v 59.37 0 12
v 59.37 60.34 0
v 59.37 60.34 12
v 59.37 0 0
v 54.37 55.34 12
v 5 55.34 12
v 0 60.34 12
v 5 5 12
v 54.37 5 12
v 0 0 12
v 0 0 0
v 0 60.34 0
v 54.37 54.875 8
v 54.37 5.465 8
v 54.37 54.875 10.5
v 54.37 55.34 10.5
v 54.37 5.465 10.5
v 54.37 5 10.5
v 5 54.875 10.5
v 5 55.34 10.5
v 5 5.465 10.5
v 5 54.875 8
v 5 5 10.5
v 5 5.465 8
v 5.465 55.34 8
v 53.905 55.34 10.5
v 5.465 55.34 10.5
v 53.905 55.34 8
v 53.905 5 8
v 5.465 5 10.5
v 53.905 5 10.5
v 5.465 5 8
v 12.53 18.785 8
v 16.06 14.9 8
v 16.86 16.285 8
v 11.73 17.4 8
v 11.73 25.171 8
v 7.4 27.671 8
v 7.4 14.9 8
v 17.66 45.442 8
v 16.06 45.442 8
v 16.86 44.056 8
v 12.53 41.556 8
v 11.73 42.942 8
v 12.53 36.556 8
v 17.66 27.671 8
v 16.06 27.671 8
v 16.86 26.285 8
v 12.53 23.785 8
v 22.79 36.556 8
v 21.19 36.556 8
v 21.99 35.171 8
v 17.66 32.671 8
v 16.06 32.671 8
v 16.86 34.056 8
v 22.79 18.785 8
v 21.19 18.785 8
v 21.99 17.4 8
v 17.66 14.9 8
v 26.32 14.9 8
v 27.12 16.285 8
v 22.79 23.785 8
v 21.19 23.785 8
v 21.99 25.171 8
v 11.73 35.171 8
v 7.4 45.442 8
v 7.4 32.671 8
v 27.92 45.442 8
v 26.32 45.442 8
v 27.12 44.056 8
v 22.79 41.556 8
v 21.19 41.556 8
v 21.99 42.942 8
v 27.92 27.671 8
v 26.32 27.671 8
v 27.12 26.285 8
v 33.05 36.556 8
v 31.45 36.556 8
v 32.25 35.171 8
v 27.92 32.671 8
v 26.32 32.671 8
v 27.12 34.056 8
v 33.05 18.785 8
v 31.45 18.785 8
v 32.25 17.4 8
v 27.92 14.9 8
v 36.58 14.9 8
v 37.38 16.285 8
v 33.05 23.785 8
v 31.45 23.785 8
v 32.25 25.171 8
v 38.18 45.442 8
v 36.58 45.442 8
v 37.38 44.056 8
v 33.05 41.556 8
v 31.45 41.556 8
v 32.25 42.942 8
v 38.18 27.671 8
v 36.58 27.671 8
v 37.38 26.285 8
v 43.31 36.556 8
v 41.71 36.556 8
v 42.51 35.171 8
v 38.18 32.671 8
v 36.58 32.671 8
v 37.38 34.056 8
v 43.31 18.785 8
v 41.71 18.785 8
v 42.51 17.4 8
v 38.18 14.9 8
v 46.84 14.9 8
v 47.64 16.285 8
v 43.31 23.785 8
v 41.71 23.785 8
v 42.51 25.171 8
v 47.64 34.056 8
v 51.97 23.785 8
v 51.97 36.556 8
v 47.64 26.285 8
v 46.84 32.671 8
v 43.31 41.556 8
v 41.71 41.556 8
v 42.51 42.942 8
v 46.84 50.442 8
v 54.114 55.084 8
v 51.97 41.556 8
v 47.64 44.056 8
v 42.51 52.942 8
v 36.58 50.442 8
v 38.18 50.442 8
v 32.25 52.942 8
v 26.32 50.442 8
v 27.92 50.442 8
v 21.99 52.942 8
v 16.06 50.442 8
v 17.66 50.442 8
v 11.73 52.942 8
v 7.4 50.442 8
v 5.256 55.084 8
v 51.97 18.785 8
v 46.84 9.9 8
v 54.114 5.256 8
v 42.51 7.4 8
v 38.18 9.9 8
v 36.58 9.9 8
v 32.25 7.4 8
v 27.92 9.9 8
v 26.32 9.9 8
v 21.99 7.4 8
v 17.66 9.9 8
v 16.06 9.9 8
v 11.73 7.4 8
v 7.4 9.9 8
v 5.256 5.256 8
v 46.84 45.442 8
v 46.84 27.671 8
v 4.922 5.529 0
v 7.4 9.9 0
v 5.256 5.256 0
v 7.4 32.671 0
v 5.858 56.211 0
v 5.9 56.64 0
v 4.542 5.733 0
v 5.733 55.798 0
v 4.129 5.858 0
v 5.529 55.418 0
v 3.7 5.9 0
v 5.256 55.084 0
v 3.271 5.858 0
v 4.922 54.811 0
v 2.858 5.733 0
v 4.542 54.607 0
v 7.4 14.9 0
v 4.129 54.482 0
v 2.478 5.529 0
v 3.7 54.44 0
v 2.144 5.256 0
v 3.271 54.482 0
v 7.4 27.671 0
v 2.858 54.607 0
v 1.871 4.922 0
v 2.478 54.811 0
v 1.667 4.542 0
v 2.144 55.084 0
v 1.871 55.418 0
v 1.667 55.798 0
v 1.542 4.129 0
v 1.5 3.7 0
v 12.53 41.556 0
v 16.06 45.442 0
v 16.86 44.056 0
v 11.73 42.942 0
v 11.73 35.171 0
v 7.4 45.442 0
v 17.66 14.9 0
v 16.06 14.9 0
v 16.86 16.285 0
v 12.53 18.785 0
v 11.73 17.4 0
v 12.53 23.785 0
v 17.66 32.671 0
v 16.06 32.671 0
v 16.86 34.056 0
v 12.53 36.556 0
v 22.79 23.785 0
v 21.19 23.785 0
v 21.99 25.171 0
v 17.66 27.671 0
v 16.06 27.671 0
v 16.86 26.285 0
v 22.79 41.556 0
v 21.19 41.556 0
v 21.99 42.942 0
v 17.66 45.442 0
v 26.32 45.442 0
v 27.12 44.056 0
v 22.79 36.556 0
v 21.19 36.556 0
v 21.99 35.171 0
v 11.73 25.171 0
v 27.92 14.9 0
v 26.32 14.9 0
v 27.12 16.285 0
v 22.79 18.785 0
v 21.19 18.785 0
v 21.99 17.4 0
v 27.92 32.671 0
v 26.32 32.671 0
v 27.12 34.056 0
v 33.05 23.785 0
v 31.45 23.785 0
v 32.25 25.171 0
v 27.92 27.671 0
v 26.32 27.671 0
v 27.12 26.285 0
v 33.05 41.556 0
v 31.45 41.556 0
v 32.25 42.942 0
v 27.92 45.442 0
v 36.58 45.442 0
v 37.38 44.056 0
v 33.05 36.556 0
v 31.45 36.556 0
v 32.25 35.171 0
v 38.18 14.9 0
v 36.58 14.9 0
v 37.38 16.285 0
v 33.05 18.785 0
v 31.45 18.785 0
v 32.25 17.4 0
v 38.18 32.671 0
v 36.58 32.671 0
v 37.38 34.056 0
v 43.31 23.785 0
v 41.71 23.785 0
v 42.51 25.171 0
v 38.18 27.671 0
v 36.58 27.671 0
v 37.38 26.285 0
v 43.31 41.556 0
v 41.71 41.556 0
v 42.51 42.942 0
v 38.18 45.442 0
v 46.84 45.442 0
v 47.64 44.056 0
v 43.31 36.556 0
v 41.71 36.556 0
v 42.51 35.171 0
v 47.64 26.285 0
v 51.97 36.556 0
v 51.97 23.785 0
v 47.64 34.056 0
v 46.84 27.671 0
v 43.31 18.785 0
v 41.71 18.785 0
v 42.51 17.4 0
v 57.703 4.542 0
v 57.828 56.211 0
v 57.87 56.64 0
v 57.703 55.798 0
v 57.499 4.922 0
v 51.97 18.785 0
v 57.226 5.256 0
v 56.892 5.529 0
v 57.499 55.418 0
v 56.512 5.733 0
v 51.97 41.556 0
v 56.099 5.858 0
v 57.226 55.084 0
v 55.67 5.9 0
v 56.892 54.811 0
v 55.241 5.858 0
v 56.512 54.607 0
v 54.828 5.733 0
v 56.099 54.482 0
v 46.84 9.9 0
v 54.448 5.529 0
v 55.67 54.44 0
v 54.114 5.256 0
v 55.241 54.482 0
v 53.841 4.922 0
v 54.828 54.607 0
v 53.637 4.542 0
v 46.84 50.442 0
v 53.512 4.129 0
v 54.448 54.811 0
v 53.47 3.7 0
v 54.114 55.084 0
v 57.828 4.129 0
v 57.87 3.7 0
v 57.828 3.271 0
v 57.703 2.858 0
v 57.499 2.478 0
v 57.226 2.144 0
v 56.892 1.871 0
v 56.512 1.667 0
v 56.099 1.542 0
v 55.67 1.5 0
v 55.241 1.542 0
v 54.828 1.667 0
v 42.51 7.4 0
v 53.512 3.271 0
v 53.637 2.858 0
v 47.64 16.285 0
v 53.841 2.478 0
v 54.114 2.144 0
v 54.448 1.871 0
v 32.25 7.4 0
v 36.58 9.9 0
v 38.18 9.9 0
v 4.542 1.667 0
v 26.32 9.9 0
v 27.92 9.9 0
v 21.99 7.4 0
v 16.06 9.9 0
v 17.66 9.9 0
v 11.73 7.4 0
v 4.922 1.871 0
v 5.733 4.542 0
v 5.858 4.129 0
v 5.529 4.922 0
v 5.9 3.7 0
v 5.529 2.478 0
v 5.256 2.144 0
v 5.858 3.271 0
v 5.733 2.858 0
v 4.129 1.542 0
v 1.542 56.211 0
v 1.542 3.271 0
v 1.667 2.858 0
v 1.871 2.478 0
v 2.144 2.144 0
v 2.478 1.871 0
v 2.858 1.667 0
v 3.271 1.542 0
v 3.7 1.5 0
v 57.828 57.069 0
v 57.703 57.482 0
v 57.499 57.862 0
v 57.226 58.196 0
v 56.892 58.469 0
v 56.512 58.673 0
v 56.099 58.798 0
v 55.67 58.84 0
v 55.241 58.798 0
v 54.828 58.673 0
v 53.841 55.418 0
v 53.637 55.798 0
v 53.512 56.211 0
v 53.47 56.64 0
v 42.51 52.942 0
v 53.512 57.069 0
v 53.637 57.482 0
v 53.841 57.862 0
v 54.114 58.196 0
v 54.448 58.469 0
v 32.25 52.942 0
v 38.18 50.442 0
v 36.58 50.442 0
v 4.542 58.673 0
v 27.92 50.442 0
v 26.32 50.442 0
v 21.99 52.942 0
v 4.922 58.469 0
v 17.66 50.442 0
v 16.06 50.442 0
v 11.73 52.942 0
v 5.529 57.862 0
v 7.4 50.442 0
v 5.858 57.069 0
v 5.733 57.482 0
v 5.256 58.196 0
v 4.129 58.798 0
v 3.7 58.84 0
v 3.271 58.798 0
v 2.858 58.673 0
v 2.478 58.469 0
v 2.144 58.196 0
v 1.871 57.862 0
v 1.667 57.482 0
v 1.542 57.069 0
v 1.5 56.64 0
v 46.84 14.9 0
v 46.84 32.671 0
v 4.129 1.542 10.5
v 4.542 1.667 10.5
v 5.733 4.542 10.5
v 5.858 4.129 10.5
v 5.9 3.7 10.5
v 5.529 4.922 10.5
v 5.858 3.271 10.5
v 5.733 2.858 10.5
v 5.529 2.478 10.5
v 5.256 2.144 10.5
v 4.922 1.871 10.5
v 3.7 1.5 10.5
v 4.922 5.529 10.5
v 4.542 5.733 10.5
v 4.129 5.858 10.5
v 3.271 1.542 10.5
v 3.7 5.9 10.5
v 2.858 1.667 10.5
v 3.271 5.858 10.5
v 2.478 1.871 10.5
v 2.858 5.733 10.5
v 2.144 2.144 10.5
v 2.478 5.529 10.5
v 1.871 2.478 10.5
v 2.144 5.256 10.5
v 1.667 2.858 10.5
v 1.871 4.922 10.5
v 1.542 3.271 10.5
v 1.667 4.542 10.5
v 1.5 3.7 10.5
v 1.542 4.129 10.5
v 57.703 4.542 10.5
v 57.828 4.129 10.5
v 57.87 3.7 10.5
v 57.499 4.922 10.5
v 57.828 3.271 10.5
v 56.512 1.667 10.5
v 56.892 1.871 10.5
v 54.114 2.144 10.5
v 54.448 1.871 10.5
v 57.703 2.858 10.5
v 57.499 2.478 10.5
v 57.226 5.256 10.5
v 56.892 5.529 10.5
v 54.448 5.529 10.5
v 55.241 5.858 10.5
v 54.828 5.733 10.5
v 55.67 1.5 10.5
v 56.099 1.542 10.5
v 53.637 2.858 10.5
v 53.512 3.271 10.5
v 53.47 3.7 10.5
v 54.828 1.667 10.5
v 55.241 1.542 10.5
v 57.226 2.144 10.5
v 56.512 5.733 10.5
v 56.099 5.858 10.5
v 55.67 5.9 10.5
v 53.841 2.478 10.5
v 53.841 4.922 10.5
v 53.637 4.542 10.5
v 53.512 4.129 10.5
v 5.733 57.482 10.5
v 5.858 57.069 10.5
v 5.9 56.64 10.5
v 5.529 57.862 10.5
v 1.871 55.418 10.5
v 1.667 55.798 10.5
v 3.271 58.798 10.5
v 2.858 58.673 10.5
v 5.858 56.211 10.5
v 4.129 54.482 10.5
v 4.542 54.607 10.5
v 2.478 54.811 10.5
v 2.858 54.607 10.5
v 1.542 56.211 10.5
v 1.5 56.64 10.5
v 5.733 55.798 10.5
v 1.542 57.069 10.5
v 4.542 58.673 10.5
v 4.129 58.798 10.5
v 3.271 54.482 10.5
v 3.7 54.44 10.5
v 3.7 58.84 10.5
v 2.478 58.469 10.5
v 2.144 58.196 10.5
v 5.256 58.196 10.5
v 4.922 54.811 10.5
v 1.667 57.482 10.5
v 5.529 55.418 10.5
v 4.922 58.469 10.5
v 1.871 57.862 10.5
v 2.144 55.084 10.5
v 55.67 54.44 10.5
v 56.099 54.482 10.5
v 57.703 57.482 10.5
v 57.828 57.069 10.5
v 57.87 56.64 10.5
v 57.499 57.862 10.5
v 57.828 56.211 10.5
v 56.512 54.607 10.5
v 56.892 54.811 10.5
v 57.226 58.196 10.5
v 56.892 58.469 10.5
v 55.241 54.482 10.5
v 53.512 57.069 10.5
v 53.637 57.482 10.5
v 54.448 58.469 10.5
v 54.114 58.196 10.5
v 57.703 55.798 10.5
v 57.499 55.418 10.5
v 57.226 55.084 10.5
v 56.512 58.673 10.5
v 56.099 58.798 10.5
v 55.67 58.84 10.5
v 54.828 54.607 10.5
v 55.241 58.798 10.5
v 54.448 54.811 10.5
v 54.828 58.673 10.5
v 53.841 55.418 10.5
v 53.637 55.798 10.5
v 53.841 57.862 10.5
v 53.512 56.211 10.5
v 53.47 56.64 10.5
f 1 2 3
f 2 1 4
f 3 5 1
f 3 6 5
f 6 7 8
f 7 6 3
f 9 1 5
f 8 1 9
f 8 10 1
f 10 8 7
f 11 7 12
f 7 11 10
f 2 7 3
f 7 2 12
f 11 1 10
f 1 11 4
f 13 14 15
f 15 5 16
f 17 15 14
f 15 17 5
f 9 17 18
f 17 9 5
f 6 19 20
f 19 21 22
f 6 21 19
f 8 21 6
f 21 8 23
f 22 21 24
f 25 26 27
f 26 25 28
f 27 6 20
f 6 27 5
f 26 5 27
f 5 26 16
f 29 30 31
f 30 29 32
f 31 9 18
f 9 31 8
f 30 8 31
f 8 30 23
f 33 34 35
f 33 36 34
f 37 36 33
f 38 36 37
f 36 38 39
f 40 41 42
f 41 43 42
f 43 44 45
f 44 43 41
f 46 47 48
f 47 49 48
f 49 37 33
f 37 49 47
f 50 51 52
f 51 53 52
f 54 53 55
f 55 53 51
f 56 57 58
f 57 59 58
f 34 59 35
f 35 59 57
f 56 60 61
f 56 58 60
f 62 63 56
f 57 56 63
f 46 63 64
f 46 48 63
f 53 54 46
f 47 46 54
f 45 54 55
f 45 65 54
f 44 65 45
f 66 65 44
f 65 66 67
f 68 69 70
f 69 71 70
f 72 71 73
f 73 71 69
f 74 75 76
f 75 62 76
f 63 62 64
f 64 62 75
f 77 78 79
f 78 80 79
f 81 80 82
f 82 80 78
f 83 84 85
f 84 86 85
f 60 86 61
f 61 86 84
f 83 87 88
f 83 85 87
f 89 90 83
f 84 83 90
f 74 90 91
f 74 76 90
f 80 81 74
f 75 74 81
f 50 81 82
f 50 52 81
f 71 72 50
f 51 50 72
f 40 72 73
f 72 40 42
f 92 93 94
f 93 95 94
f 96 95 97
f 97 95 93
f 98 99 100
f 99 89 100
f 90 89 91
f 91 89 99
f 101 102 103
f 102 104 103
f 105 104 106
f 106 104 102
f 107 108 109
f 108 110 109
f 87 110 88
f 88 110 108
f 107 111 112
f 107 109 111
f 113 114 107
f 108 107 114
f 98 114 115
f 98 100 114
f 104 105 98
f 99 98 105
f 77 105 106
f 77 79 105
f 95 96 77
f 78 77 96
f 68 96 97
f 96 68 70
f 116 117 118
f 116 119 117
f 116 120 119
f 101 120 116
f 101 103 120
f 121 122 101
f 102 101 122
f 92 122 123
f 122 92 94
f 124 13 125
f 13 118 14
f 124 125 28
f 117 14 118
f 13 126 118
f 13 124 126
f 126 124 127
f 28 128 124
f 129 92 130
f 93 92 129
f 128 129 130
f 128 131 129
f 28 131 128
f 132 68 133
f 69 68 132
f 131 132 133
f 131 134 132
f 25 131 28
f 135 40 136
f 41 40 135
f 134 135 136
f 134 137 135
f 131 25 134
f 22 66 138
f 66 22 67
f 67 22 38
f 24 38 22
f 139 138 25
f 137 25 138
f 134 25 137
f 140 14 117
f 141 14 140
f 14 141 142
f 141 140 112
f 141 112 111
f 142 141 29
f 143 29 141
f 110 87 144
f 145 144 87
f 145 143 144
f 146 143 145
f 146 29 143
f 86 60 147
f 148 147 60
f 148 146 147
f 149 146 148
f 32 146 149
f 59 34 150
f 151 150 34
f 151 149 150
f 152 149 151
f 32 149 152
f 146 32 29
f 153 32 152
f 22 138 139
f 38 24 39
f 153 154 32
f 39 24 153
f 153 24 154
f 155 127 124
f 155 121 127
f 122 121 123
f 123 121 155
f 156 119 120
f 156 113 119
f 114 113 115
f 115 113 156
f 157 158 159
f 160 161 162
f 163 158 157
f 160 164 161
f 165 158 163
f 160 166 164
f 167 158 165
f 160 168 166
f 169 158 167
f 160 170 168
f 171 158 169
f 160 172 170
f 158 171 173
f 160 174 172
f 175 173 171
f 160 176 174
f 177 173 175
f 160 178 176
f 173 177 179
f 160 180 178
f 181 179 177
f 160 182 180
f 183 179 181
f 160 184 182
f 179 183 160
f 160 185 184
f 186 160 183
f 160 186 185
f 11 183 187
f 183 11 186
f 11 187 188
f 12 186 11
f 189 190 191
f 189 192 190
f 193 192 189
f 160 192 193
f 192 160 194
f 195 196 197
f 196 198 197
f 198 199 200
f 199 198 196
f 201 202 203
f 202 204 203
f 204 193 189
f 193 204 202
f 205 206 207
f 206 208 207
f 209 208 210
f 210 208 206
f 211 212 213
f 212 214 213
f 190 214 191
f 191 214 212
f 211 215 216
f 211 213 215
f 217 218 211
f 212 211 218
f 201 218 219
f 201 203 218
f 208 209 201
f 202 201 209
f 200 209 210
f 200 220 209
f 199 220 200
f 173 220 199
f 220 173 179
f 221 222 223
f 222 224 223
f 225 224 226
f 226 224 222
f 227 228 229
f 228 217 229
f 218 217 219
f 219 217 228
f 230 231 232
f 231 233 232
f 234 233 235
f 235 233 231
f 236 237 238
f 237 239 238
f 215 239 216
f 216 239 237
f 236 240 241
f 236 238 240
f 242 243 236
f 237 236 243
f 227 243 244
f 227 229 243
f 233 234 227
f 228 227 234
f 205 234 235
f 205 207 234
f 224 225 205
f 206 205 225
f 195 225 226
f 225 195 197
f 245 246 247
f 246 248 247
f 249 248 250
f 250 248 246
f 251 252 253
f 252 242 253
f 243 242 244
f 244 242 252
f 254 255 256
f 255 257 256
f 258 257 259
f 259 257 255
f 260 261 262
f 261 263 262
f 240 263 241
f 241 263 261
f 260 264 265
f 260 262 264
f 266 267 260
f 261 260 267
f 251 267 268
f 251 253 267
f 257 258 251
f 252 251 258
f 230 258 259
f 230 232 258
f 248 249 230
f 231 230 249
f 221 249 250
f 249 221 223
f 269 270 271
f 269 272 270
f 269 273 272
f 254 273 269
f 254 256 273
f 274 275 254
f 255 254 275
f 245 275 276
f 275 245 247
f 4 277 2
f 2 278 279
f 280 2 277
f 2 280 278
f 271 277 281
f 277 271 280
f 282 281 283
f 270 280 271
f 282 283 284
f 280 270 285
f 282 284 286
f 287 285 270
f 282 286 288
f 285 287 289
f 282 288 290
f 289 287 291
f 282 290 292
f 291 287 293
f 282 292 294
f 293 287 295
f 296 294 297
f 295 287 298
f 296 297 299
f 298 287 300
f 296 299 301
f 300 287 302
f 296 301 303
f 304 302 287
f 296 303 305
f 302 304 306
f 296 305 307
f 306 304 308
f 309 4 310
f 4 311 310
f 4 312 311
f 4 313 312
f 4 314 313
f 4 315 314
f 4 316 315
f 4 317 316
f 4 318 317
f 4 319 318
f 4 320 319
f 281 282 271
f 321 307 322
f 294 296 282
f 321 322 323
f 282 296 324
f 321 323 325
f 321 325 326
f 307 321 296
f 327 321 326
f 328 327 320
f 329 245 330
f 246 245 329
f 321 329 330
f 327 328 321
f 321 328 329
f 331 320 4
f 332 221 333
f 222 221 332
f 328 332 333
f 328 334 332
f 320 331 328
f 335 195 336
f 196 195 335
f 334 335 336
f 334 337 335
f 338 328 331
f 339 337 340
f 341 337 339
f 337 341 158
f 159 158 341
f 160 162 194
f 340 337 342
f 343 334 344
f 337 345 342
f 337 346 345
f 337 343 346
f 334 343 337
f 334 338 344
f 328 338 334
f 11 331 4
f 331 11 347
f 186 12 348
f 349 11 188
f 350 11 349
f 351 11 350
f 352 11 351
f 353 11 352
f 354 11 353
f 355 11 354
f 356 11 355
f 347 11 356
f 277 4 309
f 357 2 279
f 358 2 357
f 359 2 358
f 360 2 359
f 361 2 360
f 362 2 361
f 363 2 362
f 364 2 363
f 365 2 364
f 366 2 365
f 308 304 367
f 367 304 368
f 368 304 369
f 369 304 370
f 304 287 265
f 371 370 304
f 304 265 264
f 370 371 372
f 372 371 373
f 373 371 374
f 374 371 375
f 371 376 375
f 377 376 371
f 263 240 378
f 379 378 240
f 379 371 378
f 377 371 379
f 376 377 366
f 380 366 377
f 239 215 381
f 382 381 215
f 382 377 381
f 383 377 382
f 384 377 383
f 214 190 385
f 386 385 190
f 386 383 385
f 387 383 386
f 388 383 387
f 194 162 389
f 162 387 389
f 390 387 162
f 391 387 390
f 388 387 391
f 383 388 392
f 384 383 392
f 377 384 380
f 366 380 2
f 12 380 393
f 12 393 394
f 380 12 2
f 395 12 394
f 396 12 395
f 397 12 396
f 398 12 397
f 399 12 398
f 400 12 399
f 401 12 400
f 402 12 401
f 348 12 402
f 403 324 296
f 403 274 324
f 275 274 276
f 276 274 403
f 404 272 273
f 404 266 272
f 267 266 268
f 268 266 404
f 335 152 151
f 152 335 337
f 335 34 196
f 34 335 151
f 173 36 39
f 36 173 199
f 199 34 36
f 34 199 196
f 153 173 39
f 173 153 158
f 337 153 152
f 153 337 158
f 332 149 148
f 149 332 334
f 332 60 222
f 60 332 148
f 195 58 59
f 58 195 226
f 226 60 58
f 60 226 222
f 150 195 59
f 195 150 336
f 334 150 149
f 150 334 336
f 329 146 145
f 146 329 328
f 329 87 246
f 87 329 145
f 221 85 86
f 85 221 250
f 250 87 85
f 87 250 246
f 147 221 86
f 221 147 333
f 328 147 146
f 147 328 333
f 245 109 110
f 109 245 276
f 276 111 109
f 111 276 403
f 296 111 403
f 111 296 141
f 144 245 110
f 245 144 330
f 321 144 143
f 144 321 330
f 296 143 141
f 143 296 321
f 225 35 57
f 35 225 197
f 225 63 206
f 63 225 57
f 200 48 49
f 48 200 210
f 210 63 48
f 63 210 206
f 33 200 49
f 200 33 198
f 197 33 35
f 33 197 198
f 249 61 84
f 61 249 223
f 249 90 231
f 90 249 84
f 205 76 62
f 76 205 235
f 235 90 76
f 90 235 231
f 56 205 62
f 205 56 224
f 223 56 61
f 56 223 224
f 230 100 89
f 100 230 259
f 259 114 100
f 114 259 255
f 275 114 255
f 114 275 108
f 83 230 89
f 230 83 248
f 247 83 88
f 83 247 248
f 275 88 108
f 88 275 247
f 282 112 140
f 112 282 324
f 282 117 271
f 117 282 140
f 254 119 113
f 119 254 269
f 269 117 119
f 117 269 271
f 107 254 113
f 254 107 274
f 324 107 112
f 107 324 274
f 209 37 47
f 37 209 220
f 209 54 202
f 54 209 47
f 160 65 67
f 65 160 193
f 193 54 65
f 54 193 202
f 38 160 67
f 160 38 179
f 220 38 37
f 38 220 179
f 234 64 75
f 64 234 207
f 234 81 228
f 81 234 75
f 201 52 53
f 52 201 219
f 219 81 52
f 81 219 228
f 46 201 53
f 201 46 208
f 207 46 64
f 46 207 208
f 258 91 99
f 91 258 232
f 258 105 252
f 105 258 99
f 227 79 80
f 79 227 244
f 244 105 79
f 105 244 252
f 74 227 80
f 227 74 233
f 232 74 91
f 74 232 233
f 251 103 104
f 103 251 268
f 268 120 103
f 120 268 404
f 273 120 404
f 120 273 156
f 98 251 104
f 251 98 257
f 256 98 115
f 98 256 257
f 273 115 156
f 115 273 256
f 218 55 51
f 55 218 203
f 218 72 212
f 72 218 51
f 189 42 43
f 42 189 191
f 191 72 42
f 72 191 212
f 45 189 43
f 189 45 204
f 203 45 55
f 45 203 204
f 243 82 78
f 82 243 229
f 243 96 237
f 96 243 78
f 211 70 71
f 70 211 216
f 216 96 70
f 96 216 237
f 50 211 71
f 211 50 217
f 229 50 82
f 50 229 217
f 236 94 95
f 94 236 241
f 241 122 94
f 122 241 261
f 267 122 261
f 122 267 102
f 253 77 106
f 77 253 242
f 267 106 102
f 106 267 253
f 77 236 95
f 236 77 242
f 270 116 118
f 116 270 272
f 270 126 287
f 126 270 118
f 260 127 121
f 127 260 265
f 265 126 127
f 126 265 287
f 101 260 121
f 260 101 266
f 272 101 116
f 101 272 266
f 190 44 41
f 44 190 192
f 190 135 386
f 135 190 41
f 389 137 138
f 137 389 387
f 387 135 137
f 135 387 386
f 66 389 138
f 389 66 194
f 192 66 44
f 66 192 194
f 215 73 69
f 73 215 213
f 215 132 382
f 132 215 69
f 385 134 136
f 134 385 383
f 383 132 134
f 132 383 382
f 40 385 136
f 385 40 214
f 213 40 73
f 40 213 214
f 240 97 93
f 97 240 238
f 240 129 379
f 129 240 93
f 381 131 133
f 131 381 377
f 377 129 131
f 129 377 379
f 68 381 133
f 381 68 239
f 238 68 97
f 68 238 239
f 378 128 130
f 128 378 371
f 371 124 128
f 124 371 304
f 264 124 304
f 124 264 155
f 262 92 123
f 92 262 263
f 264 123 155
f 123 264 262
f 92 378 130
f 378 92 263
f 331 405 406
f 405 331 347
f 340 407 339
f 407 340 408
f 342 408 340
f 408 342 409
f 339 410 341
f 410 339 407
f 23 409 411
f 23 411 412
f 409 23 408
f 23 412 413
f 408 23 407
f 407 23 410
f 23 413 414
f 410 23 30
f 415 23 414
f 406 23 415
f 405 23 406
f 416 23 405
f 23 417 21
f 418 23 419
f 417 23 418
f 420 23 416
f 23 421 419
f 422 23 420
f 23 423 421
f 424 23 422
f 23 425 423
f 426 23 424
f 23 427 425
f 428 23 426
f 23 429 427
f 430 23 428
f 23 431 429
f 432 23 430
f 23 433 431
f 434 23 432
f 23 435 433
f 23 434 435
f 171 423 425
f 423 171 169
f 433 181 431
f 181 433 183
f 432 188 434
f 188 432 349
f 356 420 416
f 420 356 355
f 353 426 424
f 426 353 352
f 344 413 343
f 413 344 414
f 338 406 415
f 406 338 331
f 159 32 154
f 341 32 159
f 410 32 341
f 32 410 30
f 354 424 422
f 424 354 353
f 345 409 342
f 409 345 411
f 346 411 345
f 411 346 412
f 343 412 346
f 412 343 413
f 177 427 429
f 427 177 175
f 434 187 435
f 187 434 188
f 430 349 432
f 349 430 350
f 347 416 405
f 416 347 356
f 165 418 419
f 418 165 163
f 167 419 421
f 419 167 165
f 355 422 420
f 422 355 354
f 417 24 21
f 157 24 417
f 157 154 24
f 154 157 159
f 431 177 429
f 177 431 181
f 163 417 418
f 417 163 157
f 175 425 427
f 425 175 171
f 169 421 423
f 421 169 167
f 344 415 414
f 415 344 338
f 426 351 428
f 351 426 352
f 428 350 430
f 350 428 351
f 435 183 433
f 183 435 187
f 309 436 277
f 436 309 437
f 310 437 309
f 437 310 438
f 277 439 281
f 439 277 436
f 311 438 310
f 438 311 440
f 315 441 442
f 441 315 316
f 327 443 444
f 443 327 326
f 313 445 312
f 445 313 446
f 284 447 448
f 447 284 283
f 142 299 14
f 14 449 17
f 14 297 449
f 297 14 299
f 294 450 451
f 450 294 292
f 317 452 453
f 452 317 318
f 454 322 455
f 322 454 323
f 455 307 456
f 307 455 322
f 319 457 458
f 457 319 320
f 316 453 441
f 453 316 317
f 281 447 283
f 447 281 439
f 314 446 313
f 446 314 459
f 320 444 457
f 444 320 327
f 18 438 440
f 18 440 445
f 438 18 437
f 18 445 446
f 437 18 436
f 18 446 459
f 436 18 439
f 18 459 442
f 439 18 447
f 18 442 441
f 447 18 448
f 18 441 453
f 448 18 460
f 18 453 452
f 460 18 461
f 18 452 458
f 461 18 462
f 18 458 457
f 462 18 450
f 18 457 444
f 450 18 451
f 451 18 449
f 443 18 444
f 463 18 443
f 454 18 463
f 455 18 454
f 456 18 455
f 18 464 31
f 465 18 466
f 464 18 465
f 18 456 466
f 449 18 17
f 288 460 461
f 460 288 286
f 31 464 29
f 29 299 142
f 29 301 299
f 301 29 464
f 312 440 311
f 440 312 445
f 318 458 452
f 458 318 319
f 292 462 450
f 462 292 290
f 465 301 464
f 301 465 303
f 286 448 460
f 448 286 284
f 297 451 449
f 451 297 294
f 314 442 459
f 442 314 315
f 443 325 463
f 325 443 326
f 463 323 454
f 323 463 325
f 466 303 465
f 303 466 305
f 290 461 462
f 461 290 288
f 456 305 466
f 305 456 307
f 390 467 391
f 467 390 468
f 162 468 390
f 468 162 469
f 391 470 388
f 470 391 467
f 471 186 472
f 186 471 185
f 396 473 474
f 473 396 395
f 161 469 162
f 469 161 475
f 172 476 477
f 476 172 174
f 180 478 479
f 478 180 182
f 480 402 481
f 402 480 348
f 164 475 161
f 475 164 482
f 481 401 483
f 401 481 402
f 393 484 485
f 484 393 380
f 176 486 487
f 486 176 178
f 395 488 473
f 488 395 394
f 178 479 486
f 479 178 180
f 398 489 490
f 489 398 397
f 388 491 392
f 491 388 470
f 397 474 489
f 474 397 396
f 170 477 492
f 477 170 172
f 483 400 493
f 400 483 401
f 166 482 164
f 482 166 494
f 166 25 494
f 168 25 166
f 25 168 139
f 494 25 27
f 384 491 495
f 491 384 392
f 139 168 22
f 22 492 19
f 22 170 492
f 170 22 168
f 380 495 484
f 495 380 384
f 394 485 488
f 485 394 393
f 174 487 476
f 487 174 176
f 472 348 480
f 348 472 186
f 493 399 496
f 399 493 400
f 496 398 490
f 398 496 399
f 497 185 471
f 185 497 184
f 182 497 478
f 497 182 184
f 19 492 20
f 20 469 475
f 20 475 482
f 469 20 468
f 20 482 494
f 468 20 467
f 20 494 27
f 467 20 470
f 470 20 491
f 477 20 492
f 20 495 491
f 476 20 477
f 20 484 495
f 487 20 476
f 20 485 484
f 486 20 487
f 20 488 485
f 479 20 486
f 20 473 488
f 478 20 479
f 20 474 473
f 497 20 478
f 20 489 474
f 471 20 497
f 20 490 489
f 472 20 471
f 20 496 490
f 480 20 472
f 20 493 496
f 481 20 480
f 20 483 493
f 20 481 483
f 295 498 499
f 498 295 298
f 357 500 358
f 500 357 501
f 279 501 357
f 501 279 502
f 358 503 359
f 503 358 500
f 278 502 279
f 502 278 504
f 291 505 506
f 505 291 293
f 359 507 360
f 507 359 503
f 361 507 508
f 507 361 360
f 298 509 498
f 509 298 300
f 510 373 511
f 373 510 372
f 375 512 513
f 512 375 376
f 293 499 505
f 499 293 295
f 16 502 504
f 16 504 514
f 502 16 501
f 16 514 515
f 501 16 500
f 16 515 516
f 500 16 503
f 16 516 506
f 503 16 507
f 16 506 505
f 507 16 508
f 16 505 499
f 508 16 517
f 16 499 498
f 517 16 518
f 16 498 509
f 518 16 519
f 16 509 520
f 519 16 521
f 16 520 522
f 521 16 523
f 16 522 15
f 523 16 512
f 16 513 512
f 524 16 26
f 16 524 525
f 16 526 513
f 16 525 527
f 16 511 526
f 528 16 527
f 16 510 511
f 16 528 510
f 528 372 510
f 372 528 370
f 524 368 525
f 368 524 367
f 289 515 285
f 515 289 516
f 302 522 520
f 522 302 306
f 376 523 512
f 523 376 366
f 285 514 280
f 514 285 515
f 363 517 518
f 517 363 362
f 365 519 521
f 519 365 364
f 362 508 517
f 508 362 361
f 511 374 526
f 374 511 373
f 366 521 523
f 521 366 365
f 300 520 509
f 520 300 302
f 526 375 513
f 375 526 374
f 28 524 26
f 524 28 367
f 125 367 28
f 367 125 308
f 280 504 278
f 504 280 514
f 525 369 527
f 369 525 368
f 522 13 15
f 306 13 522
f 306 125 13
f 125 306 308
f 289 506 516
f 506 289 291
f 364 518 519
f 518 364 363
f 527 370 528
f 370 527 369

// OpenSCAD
$fn = 32;

// ----------------------------------------------------------------------
// Honeycomb panel: 59.37 x 60.34 mm, 20 cells of 10 mm
// ----------------------------------------------------------------------

// --- parameters (mm) ---
panel_w = 59.37;          // panel width
panel_d = 60.34;          // panel depth
thick = 8;                // panel thickness
cell_r = 5;               // hex cell circumradius
pitch = 10.26;            // hex cell pitch (centre to centre)
web = 1.6;                // web between the cells
columns = 4;              // columns of cells
rows = 5;                 // rows of cells
cell_count = 20;          // total cells
shift_x = 11.73;          // first cell offset in x
shift_y = 12.4;           // first cell offset in y
mount_d = 4.4;            // corner mounting holes
hole_off = 3.7;           // mounting hole offset from the corners
rim_h = 12;               // rim height
rim_t = 5;                // rim wall thickness

difference() {
  union() {
    cube([panel_w, panel_d, thick]);
    /* rim around the panel, sunk 1 mm into the plate */
    translate([0, 0, thick - 1]) difference() {
      cube([panel_w, panel_d, rim_h - thick + 1]);
      translate([rim_t, rim_t, -2.5]) cube([panel_w - 2 * rim_t, panel_d - 2 * rim_t, rim_h - thick + 6]);
    }
  }
  /* hexagonal cells, point-up, cut right through the plate */
  for (row = [0 : rows - 1]) {
    for (col = [0 : columns - 1]) {
      translate([shift_x + col * pitch + (row % 2) * pitch / 2, shift_y + row * pitch * 0.866025, -2.5]) rotate([0, 0, 30]) cylinder(h = thick + 5, d = 2 * cell_r, $fn = 6);
    }
  }
  /* corner mounting holes, clear of the outer cell web */
  translate([3.7, 3.7, -2.5]) cylinder(h = thick + 5, d = mount_d);
  translate([55.67, 3.7, -2.5]) cylinder(h = thick + 5, d = mount_d);
  translate([3.7, 56.64, -2.5]) cylinder(h = thick + 5, d = mount_d);
  translate([55.67, 56.64, -2.5]) cylinder(h = thick + 5, d = mount_d);
}
